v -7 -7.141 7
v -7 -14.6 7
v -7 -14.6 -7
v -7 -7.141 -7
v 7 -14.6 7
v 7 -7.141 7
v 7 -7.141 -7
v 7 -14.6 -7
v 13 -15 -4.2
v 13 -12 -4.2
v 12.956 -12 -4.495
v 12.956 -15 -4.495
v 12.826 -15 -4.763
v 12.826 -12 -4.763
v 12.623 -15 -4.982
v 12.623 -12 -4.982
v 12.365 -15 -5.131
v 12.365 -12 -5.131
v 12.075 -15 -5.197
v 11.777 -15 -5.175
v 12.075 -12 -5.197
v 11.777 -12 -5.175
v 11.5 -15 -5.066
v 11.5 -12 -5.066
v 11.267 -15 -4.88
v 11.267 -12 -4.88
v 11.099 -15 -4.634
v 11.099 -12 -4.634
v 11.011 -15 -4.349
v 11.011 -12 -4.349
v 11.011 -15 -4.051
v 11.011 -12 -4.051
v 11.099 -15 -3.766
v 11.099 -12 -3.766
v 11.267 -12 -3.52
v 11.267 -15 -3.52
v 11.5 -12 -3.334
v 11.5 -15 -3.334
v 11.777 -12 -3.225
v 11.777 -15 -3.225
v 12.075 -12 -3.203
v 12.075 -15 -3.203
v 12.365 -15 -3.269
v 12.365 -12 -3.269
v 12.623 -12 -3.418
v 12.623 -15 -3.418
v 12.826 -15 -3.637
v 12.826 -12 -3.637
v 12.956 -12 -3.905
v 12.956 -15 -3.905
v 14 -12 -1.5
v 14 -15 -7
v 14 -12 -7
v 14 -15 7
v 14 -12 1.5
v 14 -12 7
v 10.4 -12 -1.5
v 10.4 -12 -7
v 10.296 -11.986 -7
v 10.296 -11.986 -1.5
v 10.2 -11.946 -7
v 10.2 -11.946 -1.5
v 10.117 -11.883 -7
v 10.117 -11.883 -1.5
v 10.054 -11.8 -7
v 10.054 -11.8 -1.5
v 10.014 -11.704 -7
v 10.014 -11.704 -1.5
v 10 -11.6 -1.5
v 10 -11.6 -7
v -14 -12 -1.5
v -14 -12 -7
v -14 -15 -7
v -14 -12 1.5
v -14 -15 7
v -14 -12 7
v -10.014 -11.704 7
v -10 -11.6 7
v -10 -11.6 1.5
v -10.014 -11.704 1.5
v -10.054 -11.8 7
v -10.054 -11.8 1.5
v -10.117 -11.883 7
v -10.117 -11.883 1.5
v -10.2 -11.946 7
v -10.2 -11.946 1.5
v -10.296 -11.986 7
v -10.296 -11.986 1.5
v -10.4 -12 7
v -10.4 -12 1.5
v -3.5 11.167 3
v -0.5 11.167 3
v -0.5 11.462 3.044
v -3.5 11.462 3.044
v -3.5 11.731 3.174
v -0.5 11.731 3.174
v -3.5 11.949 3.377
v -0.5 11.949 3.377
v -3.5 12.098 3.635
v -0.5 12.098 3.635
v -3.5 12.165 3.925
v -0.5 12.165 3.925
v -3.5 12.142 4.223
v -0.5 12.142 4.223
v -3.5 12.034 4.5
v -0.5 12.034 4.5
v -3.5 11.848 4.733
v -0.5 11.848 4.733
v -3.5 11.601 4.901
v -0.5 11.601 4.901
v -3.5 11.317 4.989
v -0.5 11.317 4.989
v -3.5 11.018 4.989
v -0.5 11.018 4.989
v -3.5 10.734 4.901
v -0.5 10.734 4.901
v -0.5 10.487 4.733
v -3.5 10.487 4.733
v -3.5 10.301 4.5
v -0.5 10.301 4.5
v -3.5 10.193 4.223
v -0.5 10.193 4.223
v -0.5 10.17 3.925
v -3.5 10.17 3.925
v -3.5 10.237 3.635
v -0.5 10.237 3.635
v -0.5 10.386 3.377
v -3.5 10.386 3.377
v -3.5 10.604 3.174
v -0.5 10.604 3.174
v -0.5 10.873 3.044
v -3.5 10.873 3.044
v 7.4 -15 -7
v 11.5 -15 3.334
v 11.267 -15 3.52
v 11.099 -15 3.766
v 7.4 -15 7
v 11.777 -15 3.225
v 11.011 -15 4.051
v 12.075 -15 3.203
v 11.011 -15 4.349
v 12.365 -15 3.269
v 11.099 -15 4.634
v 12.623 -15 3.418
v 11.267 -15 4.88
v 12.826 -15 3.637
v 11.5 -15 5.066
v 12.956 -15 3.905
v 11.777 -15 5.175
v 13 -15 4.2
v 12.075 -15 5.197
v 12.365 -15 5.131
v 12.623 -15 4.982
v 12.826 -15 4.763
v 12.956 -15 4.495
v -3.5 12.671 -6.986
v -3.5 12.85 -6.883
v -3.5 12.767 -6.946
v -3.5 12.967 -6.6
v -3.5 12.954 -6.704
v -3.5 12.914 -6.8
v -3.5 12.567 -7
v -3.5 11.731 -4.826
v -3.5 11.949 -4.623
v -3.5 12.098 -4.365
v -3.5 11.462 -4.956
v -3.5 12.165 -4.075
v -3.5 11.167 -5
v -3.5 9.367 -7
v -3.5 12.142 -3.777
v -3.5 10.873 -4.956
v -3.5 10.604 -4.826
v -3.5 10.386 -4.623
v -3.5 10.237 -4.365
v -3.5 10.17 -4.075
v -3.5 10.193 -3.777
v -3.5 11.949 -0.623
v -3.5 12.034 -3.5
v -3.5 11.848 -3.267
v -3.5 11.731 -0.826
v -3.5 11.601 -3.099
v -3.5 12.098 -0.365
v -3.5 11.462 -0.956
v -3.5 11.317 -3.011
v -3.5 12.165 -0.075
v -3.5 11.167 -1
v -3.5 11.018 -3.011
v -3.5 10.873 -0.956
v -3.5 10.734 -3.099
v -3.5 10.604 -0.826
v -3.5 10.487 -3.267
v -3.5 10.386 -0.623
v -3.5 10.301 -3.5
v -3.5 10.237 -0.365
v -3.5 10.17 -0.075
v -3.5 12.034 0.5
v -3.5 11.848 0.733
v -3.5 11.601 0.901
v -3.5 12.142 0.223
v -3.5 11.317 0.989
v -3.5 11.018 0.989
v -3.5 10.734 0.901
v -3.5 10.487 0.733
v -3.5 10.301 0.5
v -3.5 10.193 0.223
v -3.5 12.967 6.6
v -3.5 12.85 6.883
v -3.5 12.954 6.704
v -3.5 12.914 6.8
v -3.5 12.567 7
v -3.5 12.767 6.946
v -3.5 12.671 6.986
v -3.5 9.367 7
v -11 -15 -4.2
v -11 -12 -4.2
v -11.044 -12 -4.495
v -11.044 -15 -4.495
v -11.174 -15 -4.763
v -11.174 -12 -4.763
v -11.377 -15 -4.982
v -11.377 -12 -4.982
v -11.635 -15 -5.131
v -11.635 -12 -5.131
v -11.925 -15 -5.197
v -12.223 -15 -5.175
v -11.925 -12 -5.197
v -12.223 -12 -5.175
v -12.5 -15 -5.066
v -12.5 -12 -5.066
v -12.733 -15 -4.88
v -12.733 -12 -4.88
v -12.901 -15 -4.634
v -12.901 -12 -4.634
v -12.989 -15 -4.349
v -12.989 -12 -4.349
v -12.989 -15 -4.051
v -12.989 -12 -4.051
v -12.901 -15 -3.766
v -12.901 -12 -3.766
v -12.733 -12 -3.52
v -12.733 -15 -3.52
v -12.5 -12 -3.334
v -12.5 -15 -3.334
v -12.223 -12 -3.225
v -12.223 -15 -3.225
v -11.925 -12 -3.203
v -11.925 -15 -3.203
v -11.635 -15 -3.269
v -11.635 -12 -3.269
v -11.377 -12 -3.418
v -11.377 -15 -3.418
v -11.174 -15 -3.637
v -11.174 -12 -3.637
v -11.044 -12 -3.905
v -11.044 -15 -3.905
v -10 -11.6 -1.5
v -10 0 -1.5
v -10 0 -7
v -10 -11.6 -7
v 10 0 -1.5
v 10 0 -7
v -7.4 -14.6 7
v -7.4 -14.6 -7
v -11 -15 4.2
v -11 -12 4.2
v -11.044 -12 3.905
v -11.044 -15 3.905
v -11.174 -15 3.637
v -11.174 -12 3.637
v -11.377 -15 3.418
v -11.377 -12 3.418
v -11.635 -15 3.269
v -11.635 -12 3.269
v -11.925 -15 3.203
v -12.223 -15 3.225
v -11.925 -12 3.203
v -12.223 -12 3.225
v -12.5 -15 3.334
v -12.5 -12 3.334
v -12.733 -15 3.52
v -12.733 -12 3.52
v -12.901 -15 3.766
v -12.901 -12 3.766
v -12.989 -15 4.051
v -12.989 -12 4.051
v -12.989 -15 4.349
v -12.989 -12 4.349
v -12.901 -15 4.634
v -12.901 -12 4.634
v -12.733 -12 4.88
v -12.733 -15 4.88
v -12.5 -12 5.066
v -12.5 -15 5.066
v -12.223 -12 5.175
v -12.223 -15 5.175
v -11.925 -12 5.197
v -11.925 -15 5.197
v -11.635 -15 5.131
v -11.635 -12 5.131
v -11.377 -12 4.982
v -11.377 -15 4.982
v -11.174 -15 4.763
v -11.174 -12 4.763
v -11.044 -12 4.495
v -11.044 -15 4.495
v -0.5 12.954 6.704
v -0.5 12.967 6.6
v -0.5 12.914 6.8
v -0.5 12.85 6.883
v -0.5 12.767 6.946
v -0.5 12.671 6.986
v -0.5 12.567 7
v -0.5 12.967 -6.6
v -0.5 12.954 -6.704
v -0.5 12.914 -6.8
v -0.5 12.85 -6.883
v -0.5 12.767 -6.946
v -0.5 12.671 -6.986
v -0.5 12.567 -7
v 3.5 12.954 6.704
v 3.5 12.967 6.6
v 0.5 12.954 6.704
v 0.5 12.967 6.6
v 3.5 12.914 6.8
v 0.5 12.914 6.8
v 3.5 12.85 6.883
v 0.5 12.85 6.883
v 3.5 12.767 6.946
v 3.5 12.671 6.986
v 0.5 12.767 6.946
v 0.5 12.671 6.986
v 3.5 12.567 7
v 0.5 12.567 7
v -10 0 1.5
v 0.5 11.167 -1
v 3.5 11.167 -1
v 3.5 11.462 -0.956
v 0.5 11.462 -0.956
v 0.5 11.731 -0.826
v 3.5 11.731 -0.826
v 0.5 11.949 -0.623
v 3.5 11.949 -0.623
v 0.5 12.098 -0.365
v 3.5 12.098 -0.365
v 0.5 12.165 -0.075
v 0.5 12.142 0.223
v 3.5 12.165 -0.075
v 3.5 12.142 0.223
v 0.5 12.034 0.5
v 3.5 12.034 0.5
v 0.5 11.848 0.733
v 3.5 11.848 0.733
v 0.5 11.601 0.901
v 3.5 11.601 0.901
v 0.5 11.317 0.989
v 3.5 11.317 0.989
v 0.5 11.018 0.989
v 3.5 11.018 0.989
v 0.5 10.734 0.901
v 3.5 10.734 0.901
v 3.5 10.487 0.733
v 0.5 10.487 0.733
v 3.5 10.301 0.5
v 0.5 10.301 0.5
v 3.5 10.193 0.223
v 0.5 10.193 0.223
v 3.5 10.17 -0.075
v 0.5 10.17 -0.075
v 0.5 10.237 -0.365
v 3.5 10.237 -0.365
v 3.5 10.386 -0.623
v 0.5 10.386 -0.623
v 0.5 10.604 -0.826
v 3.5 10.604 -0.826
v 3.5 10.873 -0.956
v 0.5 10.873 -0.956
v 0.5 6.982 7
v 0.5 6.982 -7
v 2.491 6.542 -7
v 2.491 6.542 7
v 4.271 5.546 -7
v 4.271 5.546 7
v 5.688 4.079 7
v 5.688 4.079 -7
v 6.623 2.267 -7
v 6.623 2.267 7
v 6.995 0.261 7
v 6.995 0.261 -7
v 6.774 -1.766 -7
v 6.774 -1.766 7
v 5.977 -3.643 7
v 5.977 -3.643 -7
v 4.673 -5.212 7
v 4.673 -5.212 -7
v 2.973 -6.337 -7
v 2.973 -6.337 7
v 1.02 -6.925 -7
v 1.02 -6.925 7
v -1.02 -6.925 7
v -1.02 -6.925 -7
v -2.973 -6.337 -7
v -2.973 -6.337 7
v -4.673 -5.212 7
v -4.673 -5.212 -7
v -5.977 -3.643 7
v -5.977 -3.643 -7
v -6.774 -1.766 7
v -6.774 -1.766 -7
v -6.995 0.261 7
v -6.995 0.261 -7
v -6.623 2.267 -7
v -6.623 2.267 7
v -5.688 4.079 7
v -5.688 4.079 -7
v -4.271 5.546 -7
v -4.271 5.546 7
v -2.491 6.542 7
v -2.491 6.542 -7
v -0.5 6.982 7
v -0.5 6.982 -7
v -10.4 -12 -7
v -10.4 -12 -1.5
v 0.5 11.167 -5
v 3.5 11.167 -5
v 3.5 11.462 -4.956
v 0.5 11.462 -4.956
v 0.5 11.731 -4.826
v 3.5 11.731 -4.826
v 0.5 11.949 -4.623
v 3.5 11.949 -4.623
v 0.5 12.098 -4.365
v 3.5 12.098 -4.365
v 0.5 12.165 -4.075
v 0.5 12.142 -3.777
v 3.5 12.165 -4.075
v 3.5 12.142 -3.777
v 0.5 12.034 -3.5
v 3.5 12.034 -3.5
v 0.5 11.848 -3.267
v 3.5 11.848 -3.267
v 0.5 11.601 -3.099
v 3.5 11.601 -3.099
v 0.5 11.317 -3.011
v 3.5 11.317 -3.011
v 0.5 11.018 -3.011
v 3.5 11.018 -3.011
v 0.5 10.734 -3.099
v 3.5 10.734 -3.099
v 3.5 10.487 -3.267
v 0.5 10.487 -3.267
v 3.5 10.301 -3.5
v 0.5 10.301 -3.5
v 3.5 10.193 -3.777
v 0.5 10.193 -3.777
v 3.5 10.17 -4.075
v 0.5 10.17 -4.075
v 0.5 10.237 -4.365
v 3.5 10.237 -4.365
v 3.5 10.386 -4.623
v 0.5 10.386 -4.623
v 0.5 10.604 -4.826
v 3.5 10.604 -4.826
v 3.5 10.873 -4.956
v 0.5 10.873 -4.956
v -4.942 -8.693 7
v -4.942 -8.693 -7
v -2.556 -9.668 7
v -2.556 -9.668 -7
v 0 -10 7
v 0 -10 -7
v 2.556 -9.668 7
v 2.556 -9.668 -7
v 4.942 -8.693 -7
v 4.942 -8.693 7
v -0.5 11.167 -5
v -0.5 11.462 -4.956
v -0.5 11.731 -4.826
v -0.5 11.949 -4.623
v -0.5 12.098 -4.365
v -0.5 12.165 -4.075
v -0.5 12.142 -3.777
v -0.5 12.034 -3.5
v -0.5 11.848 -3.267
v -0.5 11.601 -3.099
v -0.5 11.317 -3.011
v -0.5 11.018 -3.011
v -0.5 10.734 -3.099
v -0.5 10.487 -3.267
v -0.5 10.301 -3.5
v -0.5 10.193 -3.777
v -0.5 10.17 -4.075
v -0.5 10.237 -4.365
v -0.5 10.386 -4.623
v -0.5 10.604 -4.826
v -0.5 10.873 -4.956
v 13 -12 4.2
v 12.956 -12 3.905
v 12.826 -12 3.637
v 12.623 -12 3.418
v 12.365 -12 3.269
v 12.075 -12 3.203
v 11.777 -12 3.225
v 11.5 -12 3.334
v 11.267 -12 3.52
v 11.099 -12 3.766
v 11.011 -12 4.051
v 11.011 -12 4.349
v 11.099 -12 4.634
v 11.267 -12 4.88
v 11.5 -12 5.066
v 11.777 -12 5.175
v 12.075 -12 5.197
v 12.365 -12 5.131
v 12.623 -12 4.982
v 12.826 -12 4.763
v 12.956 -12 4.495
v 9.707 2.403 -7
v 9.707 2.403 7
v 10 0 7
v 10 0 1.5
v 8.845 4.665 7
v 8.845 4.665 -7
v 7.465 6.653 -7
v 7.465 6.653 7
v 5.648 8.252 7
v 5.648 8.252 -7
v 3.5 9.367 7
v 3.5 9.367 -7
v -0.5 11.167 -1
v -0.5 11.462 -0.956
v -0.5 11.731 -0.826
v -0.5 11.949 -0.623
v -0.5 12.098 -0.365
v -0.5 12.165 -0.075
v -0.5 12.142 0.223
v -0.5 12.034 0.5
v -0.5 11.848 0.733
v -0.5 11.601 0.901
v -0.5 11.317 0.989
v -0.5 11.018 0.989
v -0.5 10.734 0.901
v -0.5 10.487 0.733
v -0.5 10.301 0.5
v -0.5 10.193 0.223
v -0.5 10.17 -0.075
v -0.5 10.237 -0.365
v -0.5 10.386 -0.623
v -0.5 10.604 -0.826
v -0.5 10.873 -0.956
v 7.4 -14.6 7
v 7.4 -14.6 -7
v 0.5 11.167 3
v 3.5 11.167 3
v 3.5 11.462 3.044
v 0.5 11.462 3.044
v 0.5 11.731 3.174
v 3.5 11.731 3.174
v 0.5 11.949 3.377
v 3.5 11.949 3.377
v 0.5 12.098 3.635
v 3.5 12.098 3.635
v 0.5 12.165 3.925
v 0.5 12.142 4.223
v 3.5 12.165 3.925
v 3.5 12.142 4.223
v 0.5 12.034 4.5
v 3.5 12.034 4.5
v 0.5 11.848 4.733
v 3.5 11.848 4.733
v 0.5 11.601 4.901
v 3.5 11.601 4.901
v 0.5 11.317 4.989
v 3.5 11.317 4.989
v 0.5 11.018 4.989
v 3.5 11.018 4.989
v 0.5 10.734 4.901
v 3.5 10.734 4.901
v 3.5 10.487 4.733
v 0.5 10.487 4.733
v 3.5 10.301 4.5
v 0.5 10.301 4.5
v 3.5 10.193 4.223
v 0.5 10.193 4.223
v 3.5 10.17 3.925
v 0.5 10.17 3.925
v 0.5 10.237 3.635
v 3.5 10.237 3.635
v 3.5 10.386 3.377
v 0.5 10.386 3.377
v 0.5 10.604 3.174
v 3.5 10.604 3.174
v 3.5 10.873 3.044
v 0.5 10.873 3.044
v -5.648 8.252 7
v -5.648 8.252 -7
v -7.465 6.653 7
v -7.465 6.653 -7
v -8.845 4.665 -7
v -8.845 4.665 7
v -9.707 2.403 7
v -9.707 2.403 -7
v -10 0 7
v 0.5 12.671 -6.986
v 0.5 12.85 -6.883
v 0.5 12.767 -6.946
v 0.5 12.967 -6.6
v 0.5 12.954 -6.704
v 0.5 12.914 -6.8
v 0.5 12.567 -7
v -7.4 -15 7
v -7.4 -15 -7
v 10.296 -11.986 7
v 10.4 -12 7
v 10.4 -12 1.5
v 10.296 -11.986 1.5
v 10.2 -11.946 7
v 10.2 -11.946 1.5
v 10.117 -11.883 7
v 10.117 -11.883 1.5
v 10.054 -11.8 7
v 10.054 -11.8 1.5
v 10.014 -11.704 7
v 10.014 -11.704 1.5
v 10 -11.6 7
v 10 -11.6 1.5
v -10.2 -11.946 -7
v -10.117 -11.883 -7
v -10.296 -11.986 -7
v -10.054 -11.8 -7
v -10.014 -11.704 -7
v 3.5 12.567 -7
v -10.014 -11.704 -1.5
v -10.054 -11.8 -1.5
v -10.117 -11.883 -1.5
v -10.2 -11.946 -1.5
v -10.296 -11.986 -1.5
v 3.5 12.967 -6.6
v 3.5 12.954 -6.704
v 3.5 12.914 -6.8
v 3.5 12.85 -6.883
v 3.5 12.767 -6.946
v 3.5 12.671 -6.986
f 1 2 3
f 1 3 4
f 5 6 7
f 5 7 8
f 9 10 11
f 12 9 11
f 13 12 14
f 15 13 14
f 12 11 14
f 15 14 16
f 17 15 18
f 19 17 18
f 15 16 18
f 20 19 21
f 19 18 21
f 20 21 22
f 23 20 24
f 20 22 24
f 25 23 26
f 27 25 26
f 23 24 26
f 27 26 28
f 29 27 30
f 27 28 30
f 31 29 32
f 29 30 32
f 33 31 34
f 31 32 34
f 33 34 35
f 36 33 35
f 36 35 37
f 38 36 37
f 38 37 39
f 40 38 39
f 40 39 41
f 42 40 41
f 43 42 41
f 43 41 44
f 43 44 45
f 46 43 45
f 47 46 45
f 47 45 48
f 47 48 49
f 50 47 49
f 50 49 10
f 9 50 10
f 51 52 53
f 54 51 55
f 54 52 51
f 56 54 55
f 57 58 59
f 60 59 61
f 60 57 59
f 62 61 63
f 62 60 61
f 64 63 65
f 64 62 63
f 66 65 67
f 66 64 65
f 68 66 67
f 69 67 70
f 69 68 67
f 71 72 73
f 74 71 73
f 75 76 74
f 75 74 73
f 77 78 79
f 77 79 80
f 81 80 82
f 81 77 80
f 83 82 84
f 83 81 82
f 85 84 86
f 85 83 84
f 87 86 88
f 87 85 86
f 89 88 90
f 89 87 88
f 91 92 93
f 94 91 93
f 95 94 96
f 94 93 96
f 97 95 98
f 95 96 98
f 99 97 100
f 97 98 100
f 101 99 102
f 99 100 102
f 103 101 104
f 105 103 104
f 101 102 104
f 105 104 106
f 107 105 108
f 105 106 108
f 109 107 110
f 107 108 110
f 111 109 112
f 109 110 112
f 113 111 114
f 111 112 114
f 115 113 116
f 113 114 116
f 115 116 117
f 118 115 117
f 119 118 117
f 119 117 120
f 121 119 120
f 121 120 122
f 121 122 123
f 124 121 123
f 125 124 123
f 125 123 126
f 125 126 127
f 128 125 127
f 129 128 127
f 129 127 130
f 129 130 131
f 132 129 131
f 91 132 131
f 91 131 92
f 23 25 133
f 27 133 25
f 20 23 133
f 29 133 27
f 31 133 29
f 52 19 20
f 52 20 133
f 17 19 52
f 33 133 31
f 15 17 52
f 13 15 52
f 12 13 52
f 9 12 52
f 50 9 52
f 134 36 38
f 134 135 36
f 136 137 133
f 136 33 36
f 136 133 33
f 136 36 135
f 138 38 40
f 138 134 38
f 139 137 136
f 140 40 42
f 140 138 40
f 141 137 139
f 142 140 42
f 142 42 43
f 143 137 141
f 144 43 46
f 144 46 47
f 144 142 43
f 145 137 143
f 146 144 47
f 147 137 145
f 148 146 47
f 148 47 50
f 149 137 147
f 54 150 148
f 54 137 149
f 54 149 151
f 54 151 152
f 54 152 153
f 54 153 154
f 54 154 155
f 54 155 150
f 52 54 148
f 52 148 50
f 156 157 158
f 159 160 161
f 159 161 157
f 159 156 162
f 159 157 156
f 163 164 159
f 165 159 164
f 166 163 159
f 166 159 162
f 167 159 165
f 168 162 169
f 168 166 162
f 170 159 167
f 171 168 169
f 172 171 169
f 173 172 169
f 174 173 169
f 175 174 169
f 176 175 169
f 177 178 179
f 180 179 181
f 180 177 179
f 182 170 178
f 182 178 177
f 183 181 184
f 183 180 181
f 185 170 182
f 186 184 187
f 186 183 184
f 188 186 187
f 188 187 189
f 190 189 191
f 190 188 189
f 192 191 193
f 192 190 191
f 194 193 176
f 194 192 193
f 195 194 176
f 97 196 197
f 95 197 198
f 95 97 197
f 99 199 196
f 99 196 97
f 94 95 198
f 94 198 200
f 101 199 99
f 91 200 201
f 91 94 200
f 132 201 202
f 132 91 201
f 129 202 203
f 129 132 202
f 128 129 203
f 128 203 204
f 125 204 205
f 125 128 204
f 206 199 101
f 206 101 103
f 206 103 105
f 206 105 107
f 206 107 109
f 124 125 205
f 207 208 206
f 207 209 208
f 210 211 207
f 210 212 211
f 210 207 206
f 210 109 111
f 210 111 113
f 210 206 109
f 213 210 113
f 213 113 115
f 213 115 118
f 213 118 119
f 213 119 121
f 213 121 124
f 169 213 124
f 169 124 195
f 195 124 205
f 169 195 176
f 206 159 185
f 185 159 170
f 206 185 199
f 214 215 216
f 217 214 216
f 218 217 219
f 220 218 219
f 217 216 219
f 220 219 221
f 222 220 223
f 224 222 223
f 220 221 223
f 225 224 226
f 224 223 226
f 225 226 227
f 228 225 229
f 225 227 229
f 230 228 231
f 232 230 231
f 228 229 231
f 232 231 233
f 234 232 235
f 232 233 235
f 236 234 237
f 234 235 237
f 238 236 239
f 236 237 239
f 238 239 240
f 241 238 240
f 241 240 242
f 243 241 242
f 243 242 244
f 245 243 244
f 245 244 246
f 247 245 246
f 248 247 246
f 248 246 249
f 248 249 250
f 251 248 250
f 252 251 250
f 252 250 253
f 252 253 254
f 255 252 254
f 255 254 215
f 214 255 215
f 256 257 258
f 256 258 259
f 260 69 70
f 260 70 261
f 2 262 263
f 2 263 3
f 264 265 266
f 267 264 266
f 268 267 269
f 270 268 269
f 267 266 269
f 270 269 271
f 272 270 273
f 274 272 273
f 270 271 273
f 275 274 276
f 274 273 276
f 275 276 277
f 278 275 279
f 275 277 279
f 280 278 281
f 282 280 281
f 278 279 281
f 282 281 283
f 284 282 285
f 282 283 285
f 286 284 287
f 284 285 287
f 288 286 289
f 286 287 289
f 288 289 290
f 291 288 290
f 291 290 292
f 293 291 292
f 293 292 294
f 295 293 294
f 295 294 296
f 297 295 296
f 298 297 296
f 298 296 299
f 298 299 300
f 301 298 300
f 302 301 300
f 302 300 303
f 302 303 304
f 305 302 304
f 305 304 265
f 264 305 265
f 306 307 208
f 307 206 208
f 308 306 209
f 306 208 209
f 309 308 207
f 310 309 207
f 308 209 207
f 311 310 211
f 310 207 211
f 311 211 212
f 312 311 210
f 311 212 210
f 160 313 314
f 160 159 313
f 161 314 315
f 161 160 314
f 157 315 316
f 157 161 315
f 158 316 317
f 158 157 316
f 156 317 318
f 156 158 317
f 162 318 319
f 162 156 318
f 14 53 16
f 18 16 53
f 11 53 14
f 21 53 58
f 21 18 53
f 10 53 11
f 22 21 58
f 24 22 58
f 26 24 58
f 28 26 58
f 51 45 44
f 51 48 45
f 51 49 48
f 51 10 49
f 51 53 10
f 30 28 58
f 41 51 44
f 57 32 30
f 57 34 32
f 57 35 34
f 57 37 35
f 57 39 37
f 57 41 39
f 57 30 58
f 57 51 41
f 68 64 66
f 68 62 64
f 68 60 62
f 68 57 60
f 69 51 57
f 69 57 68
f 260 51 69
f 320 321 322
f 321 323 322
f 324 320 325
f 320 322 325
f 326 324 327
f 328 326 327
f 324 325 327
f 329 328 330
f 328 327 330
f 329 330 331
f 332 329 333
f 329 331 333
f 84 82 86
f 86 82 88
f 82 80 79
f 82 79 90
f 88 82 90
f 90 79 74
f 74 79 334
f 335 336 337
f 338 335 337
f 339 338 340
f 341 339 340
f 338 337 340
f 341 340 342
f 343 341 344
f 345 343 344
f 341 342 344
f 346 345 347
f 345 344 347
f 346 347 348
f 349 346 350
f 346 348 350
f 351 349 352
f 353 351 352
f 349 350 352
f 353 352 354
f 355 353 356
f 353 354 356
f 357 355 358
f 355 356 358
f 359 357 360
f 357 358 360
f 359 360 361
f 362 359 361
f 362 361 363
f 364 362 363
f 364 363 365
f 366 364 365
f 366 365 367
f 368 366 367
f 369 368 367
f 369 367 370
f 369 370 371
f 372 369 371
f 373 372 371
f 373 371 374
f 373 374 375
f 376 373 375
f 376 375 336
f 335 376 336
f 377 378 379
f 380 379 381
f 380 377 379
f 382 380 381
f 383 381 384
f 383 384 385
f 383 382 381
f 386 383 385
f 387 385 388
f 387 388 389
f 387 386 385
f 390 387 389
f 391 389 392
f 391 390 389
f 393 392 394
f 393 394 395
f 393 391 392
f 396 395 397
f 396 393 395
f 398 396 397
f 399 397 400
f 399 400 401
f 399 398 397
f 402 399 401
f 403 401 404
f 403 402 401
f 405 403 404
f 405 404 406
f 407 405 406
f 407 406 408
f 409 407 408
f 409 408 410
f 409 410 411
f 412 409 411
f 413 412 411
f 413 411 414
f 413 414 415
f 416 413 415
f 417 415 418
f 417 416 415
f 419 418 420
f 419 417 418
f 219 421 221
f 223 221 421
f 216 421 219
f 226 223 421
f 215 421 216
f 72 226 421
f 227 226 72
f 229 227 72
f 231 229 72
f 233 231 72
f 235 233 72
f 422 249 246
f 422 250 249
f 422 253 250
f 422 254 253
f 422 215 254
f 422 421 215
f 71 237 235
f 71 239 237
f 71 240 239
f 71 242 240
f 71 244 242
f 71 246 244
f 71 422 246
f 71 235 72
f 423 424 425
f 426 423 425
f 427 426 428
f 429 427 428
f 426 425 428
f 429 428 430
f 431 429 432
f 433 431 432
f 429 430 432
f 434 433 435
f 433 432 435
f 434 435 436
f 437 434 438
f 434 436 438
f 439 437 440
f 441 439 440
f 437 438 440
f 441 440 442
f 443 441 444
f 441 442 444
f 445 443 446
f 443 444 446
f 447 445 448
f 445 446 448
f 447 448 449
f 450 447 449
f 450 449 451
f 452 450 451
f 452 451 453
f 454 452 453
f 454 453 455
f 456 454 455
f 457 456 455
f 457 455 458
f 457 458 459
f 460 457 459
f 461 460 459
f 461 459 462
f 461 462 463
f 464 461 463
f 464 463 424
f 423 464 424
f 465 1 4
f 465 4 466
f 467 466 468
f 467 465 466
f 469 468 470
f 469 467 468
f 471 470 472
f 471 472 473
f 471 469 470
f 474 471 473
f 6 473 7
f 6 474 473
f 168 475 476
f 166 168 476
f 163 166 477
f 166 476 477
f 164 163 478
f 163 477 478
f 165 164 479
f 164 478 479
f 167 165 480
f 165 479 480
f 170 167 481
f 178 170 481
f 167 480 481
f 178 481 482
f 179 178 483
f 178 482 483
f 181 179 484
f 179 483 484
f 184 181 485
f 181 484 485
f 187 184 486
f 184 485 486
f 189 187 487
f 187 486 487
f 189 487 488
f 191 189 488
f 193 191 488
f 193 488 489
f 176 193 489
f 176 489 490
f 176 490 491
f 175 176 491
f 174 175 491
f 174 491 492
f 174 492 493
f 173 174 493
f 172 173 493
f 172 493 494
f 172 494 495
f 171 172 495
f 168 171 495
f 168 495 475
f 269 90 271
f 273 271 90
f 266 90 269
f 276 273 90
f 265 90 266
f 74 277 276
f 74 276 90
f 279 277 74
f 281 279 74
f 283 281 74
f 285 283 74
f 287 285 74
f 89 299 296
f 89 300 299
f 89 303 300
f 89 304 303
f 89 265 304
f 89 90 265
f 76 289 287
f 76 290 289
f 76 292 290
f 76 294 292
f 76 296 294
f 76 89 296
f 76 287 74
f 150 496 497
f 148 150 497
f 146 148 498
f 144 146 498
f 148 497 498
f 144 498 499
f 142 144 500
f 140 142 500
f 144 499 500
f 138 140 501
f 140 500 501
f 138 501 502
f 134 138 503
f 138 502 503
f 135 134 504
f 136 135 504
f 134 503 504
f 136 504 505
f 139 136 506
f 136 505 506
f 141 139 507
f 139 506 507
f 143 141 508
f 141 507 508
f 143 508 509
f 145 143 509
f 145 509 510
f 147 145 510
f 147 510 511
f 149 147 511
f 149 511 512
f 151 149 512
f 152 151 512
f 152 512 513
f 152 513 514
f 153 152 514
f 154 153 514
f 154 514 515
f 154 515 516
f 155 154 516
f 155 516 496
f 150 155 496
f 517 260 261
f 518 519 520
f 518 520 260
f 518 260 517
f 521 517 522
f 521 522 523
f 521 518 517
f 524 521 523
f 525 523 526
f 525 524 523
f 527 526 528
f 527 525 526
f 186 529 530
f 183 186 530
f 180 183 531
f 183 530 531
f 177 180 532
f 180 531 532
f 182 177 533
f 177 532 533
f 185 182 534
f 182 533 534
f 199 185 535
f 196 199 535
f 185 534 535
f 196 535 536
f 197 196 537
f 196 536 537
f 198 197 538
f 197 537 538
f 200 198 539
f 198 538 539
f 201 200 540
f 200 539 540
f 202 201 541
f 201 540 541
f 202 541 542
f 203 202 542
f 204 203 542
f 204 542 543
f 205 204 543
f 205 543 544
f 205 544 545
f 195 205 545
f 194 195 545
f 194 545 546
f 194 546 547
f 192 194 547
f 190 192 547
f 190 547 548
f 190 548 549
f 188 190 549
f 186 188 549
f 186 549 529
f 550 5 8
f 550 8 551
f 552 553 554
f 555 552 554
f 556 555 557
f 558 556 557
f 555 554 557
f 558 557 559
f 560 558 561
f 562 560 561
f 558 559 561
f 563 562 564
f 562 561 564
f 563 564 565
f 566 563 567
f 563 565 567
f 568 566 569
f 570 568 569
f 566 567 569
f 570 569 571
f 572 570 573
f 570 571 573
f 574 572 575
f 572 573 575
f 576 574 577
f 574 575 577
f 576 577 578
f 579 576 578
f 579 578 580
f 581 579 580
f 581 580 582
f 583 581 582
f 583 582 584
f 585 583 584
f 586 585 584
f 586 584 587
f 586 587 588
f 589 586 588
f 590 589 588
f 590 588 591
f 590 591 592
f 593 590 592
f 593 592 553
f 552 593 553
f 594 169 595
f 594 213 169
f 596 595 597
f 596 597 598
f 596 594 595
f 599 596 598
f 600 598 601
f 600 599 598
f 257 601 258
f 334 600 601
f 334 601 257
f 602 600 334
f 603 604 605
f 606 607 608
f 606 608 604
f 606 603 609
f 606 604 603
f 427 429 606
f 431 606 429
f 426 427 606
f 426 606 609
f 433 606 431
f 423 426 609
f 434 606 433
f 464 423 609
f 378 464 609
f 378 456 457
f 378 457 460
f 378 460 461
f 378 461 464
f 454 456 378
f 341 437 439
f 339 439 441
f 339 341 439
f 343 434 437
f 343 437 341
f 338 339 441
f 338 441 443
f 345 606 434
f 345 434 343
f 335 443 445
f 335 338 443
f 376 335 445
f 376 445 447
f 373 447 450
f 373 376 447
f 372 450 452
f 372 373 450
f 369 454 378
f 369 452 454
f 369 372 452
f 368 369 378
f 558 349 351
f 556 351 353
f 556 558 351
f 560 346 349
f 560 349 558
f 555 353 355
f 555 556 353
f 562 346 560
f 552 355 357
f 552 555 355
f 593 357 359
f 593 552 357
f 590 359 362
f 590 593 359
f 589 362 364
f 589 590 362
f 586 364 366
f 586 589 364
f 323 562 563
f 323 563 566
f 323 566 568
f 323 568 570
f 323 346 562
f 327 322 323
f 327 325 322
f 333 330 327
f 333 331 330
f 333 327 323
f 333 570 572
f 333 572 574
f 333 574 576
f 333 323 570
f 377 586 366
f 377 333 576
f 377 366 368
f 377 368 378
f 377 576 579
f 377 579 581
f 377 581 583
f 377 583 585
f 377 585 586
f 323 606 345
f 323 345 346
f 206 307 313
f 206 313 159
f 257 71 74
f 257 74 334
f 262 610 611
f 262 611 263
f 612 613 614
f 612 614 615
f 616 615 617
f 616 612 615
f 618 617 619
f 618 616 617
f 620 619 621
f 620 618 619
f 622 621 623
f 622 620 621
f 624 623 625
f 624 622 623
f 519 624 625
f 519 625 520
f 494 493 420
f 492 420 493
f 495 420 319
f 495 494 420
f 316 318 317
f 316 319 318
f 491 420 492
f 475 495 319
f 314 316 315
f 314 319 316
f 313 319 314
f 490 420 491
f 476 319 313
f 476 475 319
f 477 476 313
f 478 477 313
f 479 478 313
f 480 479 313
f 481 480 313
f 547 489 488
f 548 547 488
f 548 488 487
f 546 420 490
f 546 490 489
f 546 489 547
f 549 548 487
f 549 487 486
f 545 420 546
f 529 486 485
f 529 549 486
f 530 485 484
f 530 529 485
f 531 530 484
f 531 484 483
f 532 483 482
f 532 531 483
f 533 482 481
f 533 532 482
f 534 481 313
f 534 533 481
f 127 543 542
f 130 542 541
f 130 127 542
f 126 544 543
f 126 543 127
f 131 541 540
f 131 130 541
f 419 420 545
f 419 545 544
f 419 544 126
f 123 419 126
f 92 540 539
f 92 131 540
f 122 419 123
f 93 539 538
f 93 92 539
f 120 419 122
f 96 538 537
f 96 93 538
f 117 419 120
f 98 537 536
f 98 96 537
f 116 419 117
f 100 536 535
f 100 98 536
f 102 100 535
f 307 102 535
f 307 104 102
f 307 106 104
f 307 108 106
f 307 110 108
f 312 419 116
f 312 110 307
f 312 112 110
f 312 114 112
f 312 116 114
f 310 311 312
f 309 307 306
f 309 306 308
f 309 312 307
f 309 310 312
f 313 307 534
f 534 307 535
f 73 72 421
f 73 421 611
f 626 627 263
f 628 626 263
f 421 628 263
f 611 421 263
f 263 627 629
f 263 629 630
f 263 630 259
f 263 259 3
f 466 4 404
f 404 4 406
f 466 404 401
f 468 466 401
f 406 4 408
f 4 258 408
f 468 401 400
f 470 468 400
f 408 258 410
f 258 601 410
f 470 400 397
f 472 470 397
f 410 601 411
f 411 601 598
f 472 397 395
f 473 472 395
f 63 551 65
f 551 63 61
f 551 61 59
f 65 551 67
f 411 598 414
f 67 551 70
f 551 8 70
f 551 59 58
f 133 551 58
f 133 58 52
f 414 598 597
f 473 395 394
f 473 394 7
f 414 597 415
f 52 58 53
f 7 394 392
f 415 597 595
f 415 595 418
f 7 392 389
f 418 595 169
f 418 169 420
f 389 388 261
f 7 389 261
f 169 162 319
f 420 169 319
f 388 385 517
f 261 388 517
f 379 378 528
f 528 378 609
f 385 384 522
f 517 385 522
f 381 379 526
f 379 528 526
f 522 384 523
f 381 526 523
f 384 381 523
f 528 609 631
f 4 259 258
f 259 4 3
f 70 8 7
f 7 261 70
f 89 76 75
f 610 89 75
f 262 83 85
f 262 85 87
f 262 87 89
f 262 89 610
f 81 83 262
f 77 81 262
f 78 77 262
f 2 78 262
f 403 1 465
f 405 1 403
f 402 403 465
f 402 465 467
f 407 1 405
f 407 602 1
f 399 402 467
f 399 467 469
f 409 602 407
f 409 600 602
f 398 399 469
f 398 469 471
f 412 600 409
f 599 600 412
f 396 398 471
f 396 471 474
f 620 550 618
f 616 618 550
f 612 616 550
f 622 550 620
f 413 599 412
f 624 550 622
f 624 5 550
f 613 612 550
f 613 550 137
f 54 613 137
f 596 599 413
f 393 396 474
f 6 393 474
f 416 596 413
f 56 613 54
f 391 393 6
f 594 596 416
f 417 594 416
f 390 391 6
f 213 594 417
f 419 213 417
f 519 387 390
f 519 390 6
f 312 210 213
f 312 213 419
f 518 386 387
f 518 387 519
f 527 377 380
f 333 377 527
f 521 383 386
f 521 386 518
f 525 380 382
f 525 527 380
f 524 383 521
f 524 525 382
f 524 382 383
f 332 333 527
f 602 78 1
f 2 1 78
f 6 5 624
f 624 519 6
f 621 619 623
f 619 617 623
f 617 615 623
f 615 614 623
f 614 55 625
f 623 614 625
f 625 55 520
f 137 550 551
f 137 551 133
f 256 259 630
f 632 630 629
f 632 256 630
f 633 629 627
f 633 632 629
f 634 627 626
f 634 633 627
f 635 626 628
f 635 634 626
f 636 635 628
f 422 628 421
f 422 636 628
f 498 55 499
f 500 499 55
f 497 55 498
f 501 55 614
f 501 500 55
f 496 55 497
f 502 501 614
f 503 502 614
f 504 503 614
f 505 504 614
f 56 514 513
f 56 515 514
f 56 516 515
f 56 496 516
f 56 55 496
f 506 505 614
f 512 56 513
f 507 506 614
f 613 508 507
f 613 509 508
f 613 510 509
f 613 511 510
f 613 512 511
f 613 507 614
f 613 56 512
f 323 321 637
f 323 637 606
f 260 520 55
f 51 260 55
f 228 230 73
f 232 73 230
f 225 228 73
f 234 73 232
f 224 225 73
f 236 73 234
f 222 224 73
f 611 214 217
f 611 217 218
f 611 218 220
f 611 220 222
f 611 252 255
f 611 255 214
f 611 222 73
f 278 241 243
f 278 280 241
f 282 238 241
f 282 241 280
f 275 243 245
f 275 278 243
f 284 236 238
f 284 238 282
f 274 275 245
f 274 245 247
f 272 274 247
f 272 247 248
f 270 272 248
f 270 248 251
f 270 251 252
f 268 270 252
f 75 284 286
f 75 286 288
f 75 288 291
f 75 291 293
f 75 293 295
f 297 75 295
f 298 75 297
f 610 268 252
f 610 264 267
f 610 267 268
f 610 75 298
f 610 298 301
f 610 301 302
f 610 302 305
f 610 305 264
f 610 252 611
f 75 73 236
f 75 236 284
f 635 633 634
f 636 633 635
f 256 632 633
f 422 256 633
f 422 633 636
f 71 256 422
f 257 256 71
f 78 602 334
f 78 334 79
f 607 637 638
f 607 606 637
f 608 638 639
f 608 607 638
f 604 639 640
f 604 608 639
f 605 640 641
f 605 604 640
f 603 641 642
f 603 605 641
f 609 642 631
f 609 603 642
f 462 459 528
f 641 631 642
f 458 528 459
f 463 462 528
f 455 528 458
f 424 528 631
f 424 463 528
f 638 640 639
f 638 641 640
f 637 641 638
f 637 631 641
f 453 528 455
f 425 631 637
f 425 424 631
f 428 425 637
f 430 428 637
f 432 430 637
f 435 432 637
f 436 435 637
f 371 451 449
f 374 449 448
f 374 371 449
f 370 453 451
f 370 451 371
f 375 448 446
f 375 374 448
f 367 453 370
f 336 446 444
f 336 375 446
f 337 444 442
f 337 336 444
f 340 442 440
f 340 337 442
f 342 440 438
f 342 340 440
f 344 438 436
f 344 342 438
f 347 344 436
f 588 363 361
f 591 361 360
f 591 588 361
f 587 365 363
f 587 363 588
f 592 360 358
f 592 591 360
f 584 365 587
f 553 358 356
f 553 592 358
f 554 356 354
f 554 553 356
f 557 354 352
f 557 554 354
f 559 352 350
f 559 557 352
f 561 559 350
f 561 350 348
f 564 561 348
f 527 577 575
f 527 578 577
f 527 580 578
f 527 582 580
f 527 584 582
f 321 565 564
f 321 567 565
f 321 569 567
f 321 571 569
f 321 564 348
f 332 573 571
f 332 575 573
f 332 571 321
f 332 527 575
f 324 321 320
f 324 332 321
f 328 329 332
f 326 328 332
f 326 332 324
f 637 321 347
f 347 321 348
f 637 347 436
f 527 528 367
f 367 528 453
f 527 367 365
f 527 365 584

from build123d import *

# Parameters (mm, degrees)
SALIENTE_EXTRUIR1_DEPTH      = 7
SALIENTE_EXTRUIR1_DEPTH_BACK = 7
REDONDEO1_R                  = 0.4
SALIENTE_EXTRUIR2_DEPTH      = 1.5
SALIENTE_EXTRUIR2_DEPTH_BACK = 1.5
CORTAR_EXTRUIR1_REACH        = 31.468
CROQUIS4_R                   = 1
CROQUIS5_R                   = 1
CORTAR_EXTRUIR2_DEPTH        = 8.5


with BuildPart() as part:
    # Croquis2 → Saliente-Extruir1 (new, two sides: drawn at the far end of the back side and taken through both)
    with BuildSketch(Plane.XY.offset(-SALIENTE_EXTRUIR1_DEPTH_BACK)):
        with BuildLine():
            Line((-10, 0), (-10, -11.6))
            ThreePointArc((-10, -11.6), (-10.117157288, -11.882842712), (-10.4, -12))
            Line((-10.4, -12), (-14, -12))
            Line((-14, -12), (-14, -15))
            Line((-14, -15), (-7.4, -15))
            Line((-7.4, -15), (-7.4, -14.6))
            Line((-7.4, -14.6), (-7, -14.6))
            Line((-7, -14.6), (-7, -7.141428429))
            ThreePointArc((-7, -7.141428429), (0, -10), (7, -7.141428429))
            Line((7, -7.141428429), (7, -14.6))
            Line((7, -14.6), (7.4, -14.6))
            Line((7.4, -14.6), (7.4, -15))
            Line((7.4, -15), (14, -15))
            Line((14, -15), (14, -12))
            Line((14, -12), (10.4, -12))
            ThreePointArc((10.4, -12), (10.117157288, -11.882842712), (10, -11.6))
            Line((10, -11.6), (10, 0))
            ThreePointArc((10, 0), (8.215838363, 5.700877125), (3.5, 9.367496998))
            Line((3.5, 9.367496998), (3.5, 12.967496998))
            Line((3.5, 12.967496998), (0.5, 12.967496998))
            Line((0.5, 12.967496998), (0.5, 9.987492178))
            Line((0.5, 9.987492178), (0.5, 6.982120022))
            ThreePointArc((0.5, 6.982120022), (0, -7), (-0.5, 6.982120022))
            Line((-0.5, 6.982120022), (-0.5, 9.987492178))
            Line((-0.5, 9.987492178), (-0.5, 12.967496998))
            Line((-0.5, 12.967496998), (-3.5, 12.967496998))
            Line((-3.5, 12.967496998), (-3.5, 9.367496998))
            ThreePointArc((-3.5, 9.367496998), (-8.215838363, 5.700877125), (-10, 0))
        make_face()
    extrude(amount=SALIENTE_EXTRUIR1_DEPTH + SALIENTE_EXTRUIR1_DEPTH_BACK)

    # Redondeo1
    redondeo1_edges = [part.edges().sort_by_distance(p)[0] for p in [
        (-2, 12.967496998, 7),
        (-2, 12.967496998, -7),
        (2, 12.967496998, -7),
        (2, 12.967496998, 7),
    ]]
    fillet(redondeo1_edges, radius=REDONDEO1_R)

    # Croquis3 → Saliente-Extruir2 (add, two sides: drawn at the far end of the back side and taken through both)
    with BuildSketch(Plane.XY.offset(-SALIENTE_EXTRUIR2_DEPTH_BACK)):
        Polygon((10, 0), (14, -12), (10, -12), align=None)
        Polygon((-10, -12), (-14, -12), (-10, 0), align=None)
    extrude(amount=SALIENTE_EXTRUIR2_DEPTH + SALIENTE_EXTRUIR2_DEPTH_BACK)

    # Croquis4 → Cortar-Extruir1 (cut, up to next)
    with BuildSketch(Plane(origin=(0, -12, 0), x_dir=(1, 0, 0), z_dir=(0, 1, 0)), mode=Mode.PRIVATE) as cortar_extruir1_sk1:
        with Locations((12, -4.2)):
            Circle(CROQUIS4_R)
    cortar_extruir1_tool1 = extrude(cortar_extruir1_sk1.sketch, amount=-CORTAR_EXTRUIR1_REACH, mode=Mode.PRIVATE) & part.part
    # Croquis4 → Cortar-Extruir1 (cut, up to next)
    with BuildSketch(Plane(origin=(0, -12, 0), x_dir=(1, 0, 0), z_dir=(0, 1, 0)), mode=Mode.PRIVATE) as cortar_extruir1_sk2:
        with Locations((12, 4.2)):
            Circle(CROQUIS4_R)
    cortar_extruir1_tool2 = extrude(cortar_extruir1_sk2.sketch, amount=-CORTAR_EXTRUIR1_REACH, mode=Mode.PRIVATE) & part.part
    # Croquis4 → Cortar-Extruir1 (cut, up to next)
    with BuildSketch(Plane(origin=(0, -12, 0), x_dir=(1, 0, 0), z_dir=(0, 1, 0)), mode=Mode.PRIVATE) as cortar_extruir1_sk3:
        with Locations((-12, 4.2)):
            Circle(CROQUIS4_R)
    cortar_extruir1_tool3 = extrude(cortar_extruir1_sk3.sketch, amount=-CORTAR_EXTRUIR1_REACH, mode=Mode.PRIVATE) & part.part
    # Croquis4 → Cortar-Extruir1 (cut, up to next)
    with BuildSketch(Plane(origin=(0, -12, 0), x_dir=(1, 0, 0), z_dir=(0, 1, 0)), mode=Mode.PRIVATE) as cortar_extruir1_sk4:
        with Locations((-12, -4.2)):
            Circle(CROQUIS4_R)
    cortar_extruir1_tool4 = extrude(cortar_extruir1_sk4.sketch, amount=-CORTAR_EXTRUIR1_REACH, mode=Mode.PRIVATE) & part.part
    add(cortar_extruir1_tool1.solids().sort_by_distance((12, -12, 4.2))[0], mode=Mode.SUBTRACT)
    add(cortar_extruir1_tool2.solids().sort_by_distance((12, -12, -4.2))[0], mode=Mode.SUBTRACT)
    add(cortar_extruir1_tool3.solids().sort_by_distance((-12, -12, -4.2))[0], mode=Mode.SUBTRACT)
    add(cortar_extruir1_tool4.solids().sort_by_distance((-12, -12, 4.2))[0], mode=Mode.SUBTRACT)

    # Croquis5 → Cortar-Extruir2 (cut)
    with BuildSketch(Plane(origin=(3.5, 0, 0), x_dir=(0, 0, -1), z_dir=(1, 0, 0))):
        with Locations((0, 11.167496998)):
            Circle(CROQUIS5_R)
        with Locations((4, 11.167496998)):
            Circle(CROQUIS5_R)
        with Locations((-4, 11.167496998)):
            Circle(CROQUIS5_R)
    extrude(amount=-CORTAR_EXTRUIR2_DEPTH, mode=Mode.SUBTRACT)


solid = part.part
